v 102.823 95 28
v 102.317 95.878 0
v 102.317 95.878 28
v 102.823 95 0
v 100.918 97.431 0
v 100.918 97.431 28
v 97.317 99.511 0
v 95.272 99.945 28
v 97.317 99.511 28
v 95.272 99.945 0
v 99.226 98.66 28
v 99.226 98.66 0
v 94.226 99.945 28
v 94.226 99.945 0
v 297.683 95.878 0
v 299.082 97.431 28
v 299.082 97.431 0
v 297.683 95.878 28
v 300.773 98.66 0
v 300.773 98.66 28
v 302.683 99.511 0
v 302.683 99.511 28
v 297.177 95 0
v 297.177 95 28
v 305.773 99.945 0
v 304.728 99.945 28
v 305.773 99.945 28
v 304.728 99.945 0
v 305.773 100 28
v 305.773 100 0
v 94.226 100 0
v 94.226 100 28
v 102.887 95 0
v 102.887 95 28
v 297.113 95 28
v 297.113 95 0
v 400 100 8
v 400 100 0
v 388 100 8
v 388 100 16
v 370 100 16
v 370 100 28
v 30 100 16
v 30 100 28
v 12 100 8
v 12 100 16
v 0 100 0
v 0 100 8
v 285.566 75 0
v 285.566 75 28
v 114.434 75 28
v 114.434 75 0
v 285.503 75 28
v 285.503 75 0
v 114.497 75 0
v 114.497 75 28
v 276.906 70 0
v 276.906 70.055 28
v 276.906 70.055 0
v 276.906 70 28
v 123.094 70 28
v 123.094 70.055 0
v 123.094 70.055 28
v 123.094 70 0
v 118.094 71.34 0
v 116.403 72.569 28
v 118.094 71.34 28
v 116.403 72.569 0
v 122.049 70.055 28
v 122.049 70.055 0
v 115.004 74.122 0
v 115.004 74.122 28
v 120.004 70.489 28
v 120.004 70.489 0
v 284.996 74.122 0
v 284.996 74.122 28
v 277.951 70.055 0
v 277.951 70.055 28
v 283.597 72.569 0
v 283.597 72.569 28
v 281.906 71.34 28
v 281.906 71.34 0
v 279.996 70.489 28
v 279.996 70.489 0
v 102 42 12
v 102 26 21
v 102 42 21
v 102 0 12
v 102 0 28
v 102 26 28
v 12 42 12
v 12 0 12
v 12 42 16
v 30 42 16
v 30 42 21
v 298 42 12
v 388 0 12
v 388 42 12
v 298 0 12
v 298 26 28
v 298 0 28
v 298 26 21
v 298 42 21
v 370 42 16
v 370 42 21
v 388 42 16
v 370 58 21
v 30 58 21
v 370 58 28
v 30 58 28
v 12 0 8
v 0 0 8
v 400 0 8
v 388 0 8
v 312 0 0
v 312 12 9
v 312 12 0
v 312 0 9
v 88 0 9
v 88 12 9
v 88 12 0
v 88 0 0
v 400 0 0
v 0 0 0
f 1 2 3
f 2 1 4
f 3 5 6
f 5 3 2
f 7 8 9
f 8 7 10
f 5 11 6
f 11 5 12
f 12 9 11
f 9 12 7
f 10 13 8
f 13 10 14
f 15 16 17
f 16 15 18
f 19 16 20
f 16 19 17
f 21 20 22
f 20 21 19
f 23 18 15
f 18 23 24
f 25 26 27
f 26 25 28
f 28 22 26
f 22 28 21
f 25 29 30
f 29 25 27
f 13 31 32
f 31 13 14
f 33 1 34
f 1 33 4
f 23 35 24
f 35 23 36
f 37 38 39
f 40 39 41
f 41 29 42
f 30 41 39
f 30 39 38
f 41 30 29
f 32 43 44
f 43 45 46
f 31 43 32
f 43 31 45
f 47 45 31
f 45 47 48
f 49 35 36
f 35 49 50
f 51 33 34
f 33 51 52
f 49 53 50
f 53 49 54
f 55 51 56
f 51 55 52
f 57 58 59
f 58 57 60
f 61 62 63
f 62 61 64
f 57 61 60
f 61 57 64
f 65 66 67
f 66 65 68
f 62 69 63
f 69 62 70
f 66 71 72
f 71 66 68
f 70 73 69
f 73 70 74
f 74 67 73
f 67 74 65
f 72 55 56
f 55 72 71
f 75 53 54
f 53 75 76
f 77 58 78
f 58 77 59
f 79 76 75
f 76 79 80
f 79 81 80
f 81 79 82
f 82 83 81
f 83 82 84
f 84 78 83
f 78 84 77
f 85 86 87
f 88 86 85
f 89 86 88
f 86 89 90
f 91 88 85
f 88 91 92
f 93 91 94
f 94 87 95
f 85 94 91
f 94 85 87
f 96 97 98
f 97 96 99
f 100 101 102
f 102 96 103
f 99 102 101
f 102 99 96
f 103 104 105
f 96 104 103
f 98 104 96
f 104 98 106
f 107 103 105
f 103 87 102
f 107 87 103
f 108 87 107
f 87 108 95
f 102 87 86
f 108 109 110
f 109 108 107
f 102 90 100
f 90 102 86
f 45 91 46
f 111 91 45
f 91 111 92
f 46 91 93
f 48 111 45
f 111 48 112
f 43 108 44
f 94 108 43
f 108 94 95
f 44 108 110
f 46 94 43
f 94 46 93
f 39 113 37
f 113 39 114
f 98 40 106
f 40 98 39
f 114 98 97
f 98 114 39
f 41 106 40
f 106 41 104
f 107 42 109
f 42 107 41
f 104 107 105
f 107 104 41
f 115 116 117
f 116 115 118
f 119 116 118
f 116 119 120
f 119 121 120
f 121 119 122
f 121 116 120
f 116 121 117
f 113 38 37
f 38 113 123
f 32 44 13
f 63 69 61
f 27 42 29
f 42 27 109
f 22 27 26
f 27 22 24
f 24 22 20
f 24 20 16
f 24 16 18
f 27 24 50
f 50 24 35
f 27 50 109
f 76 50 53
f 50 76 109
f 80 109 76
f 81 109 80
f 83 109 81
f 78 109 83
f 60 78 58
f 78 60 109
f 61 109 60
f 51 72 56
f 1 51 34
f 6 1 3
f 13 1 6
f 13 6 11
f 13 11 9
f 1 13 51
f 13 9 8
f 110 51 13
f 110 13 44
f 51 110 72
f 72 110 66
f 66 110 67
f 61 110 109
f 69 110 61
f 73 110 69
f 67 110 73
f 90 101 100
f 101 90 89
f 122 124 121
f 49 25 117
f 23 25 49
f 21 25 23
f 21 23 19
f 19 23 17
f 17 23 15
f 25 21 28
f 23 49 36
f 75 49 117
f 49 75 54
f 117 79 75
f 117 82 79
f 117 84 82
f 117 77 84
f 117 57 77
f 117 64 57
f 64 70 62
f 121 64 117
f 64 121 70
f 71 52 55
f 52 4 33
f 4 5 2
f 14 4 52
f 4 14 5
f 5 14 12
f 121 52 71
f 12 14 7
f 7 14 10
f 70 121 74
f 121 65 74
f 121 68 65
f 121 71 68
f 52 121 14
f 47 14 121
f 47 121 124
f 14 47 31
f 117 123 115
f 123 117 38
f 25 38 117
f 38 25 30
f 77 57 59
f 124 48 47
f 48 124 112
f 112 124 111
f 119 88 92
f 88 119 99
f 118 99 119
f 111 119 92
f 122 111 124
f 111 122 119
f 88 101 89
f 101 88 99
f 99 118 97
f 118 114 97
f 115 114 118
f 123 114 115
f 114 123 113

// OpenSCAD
include <../src/wardrobe.scad>;
plank_xz_rear_bottom(wardrobe_n);
//github_openscad -o wardrobe_1/plank_xz_rear_bottom.stl -D wardrobe_n=1 -D cutting_edge=0 -D break_view_length=0 wardrobe_1/plank_xz_rear_bottom_stl.scad
